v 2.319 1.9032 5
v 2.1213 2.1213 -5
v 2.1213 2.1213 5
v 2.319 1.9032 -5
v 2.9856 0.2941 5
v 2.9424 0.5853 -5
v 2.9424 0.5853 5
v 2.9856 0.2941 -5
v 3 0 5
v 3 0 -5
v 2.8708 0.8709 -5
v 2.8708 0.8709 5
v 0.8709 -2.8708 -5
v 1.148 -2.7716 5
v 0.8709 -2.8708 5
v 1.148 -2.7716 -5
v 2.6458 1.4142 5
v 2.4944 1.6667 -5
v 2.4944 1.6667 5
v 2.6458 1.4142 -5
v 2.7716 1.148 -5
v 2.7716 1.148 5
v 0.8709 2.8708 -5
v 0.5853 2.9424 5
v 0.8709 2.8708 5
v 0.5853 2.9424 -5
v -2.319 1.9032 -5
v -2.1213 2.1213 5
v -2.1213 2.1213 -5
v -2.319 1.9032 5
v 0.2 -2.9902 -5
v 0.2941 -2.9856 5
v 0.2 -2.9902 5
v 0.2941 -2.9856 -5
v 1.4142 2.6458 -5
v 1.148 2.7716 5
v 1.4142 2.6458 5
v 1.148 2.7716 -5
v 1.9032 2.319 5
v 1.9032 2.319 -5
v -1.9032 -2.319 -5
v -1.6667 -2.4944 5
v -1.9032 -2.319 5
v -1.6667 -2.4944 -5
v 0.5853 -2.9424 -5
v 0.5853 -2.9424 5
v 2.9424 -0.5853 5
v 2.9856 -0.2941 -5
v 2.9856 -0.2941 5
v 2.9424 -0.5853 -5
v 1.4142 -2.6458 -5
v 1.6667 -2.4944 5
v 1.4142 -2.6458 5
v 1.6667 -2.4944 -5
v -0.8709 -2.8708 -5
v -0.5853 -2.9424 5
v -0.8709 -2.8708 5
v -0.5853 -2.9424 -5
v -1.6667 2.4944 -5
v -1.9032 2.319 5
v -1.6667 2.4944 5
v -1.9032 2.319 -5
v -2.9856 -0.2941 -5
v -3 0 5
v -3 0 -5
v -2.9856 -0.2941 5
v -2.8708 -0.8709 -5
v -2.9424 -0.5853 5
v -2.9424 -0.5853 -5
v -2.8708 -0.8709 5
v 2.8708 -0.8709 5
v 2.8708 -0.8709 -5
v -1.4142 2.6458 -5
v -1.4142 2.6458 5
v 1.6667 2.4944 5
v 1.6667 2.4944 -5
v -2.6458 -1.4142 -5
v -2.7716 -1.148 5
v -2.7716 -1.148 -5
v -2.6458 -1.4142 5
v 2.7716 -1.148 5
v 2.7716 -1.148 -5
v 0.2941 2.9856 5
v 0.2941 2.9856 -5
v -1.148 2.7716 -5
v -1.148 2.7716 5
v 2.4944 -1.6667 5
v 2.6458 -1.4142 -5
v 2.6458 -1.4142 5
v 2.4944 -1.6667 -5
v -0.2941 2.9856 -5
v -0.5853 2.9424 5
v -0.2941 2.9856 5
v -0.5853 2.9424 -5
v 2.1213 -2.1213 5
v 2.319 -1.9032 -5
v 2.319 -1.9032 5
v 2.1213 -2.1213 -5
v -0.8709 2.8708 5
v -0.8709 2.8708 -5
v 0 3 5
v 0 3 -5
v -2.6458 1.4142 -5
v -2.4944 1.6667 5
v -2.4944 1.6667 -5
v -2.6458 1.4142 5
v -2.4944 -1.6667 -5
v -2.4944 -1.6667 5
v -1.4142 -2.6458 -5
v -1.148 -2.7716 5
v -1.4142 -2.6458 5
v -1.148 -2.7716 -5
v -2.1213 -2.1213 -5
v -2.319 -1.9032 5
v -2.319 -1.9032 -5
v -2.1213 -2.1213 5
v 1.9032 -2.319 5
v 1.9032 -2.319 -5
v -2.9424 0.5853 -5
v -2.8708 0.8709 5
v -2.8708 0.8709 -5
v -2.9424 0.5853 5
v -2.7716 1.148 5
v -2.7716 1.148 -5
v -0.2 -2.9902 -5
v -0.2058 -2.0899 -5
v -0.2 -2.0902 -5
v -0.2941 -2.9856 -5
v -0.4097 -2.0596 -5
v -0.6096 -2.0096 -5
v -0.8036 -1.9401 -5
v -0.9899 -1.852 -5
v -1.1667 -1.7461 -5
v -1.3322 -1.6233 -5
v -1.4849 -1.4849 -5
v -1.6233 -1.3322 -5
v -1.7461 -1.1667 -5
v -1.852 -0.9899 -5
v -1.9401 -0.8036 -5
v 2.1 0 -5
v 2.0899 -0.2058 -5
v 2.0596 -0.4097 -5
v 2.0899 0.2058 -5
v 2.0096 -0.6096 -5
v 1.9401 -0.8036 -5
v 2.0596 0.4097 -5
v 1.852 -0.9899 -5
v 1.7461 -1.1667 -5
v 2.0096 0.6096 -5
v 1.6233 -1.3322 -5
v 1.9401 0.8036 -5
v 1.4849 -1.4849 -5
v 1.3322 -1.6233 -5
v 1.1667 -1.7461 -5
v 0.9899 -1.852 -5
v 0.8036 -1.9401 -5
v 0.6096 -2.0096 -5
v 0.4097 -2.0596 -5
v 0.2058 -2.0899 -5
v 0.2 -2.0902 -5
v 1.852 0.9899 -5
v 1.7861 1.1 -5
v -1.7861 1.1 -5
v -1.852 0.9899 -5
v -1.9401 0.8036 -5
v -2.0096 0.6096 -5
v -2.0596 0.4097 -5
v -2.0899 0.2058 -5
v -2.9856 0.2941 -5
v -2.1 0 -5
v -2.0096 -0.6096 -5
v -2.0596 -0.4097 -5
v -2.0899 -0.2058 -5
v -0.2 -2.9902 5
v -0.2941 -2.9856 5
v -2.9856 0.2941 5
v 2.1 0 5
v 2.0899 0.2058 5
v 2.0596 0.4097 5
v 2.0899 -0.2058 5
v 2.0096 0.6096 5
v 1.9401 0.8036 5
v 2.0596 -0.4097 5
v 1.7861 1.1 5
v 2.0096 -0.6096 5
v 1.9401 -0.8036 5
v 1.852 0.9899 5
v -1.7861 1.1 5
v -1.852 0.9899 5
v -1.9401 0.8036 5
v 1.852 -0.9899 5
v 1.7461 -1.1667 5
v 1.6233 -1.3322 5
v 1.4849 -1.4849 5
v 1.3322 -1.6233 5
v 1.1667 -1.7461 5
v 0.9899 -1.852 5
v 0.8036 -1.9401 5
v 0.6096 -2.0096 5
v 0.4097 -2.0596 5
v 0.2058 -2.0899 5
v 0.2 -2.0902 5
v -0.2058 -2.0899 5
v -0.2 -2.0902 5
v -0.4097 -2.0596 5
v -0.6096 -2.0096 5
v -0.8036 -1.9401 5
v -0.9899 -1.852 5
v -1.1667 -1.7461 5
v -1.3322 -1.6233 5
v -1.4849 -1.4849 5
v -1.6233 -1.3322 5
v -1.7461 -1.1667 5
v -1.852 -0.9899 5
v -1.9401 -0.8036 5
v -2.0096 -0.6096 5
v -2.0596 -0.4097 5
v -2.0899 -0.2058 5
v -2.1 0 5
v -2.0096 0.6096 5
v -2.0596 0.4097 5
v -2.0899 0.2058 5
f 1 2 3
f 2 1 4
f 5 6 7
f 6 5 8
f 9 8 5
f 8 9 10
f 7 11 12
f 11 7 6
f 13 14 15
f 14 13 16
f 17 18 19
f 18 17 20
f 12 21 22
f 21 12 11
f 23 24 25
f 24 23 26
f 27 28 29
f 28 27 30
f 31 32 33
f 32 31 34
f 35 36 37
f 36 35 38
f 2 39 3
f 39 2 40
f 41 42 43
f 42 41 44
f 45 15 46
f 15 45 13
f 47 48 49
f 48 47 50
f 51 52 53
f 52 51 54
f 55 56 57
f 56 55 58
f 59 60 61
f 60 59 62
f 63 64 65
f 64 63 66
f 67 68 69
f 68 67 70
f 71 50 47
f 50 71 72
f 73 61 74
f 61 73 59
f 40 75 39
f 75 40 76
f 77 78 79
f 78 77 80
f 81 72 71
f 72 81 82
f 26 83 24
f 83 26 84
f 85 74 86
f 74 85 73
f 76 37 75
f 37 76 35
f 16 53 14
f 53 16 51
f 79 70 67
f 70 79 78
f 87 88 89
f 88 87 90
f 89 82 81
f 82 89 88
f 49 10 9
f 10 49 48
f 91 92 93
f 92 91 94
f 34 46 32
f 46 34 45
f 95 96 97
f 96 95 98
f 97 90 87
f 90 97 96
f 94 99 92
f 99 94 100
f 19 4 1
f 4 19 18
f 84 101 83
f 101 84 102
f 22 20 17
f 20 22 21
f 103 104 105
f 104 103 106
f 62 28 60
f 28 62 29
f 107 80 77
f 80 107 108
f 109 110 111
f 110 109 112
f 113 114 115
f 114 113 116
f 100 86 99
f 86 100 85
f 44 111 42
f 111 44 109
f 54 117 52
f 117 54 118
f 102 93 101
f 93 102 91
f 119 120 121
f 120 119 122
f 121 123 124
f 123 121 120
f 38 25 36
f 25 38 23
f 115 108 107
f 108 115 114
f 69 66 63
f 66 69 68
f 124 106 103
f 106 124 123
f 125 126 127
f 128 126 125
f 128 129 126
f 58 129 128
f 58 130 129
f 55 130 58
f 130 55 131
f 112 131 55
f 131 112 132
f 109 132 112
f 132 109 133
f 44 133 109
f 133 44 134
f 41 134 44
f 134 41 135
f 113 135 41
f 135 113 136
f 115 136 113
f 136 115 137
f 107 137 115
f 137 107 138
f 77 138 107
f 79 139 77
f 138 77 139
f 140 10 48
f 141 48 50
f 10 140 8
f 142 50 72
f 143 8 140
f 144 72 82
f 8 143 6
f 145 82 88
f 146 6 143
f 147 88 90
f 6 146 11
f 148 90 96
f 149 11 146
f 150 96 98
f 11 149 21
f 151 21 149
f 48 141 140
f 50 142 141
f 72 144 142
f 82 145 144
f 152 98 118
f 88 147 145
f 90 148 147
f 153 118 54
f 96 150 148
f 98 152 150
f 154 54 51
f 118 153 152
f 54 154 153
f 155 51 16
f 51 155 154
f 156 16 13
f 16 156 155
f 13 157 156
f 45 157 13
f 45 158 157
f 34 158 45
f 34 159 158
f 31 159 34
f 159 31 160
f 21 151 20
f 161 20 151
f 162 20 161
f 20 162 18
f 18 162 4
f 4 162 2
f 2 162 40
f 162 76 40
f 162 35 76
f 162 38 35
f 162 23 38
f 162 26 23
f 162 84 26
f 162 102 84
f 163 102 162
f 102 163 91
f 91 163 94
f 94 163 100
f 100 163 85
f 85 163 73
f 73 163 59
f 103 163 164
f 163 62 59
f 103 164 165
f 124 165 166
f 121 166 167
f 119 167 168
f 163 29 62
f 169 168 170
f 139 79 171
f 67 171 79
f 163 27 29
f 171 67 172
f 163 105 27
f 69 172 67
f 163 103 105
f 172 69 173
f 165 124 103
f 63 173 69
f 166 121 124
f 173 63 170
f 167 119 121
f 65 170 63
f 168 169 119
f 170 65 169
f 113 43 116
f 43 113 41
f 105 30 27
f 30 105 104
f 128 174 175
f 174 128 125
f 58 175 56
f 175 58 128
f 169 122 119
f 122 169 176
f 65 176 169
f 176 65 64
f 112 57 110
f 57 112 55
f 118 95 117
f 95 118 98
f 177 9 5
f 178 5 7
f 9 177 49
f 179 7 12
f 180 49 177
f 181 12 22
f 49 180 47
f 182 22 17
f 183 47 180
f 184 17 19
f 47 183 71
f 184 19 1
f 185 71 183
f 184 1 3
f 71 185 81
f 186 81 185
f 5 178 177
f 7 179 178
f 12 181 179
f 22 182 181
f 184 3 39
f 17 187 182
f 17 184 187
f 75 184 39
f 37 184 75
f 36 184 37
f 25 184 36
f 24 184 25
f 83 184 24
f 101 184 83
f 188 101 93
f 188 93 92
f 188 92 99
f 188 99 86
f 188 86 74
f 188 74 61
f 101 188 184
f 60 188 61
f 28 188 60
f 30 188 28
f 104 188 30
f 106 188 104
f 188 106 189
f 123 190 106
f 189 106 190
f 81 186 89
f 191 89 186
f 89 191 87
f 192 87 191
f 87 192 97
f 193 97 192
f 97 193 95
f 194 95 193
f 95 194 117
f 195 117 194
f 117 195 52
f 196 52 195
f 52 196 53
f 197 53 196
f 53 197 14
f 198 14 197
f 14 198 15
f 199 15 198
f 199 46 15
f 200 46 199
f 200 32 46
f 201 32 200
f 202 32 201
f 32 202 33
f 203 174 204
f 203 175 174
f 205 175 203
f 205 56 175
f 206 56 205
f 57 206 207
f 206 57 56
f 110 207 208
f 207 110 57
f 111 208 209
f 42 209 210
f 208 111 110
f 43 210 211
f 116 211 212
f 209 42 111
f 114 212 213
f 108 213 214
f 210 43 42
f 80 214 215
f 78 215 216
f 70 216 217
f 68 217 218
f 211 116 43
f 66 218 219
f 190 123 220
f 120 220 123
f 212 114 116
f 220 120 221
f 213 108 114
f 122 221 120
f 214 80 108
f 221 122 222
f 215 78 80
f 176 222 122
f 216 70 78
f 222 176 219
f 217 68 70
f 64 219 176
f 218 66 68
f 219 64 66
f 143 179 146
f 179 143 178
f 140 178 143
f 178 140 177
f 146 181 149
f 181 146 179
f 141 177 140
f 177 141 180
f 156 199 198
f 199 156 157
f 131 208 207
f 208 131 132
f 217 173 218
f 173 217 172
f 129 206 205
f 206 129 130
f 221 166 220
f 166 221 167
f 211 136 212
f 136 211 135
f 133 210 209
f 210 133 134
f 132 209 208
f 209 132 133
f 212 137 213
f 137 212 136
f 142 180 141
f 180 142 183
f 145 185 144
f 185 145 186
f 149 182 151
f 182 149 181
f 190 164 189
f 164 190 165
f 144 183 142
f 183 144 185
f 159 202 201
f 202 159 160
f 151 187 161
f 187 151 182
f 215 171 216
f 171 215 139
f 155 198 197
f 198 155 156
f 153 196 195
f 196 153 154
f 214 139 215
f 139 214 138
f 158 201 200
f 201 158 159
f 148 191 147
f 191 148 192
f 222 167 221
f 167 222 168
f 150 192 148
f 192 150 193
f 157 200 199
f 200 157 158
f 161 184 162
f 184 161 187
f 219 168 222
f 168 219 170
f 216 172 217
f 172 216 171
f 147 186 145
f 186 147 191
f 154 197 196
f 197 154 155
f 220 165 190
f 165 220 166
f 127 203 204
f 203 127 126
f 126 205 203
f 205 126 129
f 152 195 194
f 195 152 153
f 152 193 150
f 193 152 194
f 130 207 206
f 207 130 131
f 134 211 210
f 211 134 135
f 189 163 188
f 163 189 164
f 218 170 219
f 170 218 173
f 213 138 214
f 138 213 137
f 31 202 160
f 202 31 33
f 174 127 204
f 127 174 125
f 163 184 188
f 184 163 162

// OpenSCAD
$fn=64;

difference(){
  cylinder(r=3, h=10, center=true);
  cylinder(r=2.1, h=12, center=true);
  translate([0, -1.6, 0])cube(size=[.4, 4, 12], center=true);

}
translate([0, 1.6, 0])cube(size=[4, 1, 10], center=true);
